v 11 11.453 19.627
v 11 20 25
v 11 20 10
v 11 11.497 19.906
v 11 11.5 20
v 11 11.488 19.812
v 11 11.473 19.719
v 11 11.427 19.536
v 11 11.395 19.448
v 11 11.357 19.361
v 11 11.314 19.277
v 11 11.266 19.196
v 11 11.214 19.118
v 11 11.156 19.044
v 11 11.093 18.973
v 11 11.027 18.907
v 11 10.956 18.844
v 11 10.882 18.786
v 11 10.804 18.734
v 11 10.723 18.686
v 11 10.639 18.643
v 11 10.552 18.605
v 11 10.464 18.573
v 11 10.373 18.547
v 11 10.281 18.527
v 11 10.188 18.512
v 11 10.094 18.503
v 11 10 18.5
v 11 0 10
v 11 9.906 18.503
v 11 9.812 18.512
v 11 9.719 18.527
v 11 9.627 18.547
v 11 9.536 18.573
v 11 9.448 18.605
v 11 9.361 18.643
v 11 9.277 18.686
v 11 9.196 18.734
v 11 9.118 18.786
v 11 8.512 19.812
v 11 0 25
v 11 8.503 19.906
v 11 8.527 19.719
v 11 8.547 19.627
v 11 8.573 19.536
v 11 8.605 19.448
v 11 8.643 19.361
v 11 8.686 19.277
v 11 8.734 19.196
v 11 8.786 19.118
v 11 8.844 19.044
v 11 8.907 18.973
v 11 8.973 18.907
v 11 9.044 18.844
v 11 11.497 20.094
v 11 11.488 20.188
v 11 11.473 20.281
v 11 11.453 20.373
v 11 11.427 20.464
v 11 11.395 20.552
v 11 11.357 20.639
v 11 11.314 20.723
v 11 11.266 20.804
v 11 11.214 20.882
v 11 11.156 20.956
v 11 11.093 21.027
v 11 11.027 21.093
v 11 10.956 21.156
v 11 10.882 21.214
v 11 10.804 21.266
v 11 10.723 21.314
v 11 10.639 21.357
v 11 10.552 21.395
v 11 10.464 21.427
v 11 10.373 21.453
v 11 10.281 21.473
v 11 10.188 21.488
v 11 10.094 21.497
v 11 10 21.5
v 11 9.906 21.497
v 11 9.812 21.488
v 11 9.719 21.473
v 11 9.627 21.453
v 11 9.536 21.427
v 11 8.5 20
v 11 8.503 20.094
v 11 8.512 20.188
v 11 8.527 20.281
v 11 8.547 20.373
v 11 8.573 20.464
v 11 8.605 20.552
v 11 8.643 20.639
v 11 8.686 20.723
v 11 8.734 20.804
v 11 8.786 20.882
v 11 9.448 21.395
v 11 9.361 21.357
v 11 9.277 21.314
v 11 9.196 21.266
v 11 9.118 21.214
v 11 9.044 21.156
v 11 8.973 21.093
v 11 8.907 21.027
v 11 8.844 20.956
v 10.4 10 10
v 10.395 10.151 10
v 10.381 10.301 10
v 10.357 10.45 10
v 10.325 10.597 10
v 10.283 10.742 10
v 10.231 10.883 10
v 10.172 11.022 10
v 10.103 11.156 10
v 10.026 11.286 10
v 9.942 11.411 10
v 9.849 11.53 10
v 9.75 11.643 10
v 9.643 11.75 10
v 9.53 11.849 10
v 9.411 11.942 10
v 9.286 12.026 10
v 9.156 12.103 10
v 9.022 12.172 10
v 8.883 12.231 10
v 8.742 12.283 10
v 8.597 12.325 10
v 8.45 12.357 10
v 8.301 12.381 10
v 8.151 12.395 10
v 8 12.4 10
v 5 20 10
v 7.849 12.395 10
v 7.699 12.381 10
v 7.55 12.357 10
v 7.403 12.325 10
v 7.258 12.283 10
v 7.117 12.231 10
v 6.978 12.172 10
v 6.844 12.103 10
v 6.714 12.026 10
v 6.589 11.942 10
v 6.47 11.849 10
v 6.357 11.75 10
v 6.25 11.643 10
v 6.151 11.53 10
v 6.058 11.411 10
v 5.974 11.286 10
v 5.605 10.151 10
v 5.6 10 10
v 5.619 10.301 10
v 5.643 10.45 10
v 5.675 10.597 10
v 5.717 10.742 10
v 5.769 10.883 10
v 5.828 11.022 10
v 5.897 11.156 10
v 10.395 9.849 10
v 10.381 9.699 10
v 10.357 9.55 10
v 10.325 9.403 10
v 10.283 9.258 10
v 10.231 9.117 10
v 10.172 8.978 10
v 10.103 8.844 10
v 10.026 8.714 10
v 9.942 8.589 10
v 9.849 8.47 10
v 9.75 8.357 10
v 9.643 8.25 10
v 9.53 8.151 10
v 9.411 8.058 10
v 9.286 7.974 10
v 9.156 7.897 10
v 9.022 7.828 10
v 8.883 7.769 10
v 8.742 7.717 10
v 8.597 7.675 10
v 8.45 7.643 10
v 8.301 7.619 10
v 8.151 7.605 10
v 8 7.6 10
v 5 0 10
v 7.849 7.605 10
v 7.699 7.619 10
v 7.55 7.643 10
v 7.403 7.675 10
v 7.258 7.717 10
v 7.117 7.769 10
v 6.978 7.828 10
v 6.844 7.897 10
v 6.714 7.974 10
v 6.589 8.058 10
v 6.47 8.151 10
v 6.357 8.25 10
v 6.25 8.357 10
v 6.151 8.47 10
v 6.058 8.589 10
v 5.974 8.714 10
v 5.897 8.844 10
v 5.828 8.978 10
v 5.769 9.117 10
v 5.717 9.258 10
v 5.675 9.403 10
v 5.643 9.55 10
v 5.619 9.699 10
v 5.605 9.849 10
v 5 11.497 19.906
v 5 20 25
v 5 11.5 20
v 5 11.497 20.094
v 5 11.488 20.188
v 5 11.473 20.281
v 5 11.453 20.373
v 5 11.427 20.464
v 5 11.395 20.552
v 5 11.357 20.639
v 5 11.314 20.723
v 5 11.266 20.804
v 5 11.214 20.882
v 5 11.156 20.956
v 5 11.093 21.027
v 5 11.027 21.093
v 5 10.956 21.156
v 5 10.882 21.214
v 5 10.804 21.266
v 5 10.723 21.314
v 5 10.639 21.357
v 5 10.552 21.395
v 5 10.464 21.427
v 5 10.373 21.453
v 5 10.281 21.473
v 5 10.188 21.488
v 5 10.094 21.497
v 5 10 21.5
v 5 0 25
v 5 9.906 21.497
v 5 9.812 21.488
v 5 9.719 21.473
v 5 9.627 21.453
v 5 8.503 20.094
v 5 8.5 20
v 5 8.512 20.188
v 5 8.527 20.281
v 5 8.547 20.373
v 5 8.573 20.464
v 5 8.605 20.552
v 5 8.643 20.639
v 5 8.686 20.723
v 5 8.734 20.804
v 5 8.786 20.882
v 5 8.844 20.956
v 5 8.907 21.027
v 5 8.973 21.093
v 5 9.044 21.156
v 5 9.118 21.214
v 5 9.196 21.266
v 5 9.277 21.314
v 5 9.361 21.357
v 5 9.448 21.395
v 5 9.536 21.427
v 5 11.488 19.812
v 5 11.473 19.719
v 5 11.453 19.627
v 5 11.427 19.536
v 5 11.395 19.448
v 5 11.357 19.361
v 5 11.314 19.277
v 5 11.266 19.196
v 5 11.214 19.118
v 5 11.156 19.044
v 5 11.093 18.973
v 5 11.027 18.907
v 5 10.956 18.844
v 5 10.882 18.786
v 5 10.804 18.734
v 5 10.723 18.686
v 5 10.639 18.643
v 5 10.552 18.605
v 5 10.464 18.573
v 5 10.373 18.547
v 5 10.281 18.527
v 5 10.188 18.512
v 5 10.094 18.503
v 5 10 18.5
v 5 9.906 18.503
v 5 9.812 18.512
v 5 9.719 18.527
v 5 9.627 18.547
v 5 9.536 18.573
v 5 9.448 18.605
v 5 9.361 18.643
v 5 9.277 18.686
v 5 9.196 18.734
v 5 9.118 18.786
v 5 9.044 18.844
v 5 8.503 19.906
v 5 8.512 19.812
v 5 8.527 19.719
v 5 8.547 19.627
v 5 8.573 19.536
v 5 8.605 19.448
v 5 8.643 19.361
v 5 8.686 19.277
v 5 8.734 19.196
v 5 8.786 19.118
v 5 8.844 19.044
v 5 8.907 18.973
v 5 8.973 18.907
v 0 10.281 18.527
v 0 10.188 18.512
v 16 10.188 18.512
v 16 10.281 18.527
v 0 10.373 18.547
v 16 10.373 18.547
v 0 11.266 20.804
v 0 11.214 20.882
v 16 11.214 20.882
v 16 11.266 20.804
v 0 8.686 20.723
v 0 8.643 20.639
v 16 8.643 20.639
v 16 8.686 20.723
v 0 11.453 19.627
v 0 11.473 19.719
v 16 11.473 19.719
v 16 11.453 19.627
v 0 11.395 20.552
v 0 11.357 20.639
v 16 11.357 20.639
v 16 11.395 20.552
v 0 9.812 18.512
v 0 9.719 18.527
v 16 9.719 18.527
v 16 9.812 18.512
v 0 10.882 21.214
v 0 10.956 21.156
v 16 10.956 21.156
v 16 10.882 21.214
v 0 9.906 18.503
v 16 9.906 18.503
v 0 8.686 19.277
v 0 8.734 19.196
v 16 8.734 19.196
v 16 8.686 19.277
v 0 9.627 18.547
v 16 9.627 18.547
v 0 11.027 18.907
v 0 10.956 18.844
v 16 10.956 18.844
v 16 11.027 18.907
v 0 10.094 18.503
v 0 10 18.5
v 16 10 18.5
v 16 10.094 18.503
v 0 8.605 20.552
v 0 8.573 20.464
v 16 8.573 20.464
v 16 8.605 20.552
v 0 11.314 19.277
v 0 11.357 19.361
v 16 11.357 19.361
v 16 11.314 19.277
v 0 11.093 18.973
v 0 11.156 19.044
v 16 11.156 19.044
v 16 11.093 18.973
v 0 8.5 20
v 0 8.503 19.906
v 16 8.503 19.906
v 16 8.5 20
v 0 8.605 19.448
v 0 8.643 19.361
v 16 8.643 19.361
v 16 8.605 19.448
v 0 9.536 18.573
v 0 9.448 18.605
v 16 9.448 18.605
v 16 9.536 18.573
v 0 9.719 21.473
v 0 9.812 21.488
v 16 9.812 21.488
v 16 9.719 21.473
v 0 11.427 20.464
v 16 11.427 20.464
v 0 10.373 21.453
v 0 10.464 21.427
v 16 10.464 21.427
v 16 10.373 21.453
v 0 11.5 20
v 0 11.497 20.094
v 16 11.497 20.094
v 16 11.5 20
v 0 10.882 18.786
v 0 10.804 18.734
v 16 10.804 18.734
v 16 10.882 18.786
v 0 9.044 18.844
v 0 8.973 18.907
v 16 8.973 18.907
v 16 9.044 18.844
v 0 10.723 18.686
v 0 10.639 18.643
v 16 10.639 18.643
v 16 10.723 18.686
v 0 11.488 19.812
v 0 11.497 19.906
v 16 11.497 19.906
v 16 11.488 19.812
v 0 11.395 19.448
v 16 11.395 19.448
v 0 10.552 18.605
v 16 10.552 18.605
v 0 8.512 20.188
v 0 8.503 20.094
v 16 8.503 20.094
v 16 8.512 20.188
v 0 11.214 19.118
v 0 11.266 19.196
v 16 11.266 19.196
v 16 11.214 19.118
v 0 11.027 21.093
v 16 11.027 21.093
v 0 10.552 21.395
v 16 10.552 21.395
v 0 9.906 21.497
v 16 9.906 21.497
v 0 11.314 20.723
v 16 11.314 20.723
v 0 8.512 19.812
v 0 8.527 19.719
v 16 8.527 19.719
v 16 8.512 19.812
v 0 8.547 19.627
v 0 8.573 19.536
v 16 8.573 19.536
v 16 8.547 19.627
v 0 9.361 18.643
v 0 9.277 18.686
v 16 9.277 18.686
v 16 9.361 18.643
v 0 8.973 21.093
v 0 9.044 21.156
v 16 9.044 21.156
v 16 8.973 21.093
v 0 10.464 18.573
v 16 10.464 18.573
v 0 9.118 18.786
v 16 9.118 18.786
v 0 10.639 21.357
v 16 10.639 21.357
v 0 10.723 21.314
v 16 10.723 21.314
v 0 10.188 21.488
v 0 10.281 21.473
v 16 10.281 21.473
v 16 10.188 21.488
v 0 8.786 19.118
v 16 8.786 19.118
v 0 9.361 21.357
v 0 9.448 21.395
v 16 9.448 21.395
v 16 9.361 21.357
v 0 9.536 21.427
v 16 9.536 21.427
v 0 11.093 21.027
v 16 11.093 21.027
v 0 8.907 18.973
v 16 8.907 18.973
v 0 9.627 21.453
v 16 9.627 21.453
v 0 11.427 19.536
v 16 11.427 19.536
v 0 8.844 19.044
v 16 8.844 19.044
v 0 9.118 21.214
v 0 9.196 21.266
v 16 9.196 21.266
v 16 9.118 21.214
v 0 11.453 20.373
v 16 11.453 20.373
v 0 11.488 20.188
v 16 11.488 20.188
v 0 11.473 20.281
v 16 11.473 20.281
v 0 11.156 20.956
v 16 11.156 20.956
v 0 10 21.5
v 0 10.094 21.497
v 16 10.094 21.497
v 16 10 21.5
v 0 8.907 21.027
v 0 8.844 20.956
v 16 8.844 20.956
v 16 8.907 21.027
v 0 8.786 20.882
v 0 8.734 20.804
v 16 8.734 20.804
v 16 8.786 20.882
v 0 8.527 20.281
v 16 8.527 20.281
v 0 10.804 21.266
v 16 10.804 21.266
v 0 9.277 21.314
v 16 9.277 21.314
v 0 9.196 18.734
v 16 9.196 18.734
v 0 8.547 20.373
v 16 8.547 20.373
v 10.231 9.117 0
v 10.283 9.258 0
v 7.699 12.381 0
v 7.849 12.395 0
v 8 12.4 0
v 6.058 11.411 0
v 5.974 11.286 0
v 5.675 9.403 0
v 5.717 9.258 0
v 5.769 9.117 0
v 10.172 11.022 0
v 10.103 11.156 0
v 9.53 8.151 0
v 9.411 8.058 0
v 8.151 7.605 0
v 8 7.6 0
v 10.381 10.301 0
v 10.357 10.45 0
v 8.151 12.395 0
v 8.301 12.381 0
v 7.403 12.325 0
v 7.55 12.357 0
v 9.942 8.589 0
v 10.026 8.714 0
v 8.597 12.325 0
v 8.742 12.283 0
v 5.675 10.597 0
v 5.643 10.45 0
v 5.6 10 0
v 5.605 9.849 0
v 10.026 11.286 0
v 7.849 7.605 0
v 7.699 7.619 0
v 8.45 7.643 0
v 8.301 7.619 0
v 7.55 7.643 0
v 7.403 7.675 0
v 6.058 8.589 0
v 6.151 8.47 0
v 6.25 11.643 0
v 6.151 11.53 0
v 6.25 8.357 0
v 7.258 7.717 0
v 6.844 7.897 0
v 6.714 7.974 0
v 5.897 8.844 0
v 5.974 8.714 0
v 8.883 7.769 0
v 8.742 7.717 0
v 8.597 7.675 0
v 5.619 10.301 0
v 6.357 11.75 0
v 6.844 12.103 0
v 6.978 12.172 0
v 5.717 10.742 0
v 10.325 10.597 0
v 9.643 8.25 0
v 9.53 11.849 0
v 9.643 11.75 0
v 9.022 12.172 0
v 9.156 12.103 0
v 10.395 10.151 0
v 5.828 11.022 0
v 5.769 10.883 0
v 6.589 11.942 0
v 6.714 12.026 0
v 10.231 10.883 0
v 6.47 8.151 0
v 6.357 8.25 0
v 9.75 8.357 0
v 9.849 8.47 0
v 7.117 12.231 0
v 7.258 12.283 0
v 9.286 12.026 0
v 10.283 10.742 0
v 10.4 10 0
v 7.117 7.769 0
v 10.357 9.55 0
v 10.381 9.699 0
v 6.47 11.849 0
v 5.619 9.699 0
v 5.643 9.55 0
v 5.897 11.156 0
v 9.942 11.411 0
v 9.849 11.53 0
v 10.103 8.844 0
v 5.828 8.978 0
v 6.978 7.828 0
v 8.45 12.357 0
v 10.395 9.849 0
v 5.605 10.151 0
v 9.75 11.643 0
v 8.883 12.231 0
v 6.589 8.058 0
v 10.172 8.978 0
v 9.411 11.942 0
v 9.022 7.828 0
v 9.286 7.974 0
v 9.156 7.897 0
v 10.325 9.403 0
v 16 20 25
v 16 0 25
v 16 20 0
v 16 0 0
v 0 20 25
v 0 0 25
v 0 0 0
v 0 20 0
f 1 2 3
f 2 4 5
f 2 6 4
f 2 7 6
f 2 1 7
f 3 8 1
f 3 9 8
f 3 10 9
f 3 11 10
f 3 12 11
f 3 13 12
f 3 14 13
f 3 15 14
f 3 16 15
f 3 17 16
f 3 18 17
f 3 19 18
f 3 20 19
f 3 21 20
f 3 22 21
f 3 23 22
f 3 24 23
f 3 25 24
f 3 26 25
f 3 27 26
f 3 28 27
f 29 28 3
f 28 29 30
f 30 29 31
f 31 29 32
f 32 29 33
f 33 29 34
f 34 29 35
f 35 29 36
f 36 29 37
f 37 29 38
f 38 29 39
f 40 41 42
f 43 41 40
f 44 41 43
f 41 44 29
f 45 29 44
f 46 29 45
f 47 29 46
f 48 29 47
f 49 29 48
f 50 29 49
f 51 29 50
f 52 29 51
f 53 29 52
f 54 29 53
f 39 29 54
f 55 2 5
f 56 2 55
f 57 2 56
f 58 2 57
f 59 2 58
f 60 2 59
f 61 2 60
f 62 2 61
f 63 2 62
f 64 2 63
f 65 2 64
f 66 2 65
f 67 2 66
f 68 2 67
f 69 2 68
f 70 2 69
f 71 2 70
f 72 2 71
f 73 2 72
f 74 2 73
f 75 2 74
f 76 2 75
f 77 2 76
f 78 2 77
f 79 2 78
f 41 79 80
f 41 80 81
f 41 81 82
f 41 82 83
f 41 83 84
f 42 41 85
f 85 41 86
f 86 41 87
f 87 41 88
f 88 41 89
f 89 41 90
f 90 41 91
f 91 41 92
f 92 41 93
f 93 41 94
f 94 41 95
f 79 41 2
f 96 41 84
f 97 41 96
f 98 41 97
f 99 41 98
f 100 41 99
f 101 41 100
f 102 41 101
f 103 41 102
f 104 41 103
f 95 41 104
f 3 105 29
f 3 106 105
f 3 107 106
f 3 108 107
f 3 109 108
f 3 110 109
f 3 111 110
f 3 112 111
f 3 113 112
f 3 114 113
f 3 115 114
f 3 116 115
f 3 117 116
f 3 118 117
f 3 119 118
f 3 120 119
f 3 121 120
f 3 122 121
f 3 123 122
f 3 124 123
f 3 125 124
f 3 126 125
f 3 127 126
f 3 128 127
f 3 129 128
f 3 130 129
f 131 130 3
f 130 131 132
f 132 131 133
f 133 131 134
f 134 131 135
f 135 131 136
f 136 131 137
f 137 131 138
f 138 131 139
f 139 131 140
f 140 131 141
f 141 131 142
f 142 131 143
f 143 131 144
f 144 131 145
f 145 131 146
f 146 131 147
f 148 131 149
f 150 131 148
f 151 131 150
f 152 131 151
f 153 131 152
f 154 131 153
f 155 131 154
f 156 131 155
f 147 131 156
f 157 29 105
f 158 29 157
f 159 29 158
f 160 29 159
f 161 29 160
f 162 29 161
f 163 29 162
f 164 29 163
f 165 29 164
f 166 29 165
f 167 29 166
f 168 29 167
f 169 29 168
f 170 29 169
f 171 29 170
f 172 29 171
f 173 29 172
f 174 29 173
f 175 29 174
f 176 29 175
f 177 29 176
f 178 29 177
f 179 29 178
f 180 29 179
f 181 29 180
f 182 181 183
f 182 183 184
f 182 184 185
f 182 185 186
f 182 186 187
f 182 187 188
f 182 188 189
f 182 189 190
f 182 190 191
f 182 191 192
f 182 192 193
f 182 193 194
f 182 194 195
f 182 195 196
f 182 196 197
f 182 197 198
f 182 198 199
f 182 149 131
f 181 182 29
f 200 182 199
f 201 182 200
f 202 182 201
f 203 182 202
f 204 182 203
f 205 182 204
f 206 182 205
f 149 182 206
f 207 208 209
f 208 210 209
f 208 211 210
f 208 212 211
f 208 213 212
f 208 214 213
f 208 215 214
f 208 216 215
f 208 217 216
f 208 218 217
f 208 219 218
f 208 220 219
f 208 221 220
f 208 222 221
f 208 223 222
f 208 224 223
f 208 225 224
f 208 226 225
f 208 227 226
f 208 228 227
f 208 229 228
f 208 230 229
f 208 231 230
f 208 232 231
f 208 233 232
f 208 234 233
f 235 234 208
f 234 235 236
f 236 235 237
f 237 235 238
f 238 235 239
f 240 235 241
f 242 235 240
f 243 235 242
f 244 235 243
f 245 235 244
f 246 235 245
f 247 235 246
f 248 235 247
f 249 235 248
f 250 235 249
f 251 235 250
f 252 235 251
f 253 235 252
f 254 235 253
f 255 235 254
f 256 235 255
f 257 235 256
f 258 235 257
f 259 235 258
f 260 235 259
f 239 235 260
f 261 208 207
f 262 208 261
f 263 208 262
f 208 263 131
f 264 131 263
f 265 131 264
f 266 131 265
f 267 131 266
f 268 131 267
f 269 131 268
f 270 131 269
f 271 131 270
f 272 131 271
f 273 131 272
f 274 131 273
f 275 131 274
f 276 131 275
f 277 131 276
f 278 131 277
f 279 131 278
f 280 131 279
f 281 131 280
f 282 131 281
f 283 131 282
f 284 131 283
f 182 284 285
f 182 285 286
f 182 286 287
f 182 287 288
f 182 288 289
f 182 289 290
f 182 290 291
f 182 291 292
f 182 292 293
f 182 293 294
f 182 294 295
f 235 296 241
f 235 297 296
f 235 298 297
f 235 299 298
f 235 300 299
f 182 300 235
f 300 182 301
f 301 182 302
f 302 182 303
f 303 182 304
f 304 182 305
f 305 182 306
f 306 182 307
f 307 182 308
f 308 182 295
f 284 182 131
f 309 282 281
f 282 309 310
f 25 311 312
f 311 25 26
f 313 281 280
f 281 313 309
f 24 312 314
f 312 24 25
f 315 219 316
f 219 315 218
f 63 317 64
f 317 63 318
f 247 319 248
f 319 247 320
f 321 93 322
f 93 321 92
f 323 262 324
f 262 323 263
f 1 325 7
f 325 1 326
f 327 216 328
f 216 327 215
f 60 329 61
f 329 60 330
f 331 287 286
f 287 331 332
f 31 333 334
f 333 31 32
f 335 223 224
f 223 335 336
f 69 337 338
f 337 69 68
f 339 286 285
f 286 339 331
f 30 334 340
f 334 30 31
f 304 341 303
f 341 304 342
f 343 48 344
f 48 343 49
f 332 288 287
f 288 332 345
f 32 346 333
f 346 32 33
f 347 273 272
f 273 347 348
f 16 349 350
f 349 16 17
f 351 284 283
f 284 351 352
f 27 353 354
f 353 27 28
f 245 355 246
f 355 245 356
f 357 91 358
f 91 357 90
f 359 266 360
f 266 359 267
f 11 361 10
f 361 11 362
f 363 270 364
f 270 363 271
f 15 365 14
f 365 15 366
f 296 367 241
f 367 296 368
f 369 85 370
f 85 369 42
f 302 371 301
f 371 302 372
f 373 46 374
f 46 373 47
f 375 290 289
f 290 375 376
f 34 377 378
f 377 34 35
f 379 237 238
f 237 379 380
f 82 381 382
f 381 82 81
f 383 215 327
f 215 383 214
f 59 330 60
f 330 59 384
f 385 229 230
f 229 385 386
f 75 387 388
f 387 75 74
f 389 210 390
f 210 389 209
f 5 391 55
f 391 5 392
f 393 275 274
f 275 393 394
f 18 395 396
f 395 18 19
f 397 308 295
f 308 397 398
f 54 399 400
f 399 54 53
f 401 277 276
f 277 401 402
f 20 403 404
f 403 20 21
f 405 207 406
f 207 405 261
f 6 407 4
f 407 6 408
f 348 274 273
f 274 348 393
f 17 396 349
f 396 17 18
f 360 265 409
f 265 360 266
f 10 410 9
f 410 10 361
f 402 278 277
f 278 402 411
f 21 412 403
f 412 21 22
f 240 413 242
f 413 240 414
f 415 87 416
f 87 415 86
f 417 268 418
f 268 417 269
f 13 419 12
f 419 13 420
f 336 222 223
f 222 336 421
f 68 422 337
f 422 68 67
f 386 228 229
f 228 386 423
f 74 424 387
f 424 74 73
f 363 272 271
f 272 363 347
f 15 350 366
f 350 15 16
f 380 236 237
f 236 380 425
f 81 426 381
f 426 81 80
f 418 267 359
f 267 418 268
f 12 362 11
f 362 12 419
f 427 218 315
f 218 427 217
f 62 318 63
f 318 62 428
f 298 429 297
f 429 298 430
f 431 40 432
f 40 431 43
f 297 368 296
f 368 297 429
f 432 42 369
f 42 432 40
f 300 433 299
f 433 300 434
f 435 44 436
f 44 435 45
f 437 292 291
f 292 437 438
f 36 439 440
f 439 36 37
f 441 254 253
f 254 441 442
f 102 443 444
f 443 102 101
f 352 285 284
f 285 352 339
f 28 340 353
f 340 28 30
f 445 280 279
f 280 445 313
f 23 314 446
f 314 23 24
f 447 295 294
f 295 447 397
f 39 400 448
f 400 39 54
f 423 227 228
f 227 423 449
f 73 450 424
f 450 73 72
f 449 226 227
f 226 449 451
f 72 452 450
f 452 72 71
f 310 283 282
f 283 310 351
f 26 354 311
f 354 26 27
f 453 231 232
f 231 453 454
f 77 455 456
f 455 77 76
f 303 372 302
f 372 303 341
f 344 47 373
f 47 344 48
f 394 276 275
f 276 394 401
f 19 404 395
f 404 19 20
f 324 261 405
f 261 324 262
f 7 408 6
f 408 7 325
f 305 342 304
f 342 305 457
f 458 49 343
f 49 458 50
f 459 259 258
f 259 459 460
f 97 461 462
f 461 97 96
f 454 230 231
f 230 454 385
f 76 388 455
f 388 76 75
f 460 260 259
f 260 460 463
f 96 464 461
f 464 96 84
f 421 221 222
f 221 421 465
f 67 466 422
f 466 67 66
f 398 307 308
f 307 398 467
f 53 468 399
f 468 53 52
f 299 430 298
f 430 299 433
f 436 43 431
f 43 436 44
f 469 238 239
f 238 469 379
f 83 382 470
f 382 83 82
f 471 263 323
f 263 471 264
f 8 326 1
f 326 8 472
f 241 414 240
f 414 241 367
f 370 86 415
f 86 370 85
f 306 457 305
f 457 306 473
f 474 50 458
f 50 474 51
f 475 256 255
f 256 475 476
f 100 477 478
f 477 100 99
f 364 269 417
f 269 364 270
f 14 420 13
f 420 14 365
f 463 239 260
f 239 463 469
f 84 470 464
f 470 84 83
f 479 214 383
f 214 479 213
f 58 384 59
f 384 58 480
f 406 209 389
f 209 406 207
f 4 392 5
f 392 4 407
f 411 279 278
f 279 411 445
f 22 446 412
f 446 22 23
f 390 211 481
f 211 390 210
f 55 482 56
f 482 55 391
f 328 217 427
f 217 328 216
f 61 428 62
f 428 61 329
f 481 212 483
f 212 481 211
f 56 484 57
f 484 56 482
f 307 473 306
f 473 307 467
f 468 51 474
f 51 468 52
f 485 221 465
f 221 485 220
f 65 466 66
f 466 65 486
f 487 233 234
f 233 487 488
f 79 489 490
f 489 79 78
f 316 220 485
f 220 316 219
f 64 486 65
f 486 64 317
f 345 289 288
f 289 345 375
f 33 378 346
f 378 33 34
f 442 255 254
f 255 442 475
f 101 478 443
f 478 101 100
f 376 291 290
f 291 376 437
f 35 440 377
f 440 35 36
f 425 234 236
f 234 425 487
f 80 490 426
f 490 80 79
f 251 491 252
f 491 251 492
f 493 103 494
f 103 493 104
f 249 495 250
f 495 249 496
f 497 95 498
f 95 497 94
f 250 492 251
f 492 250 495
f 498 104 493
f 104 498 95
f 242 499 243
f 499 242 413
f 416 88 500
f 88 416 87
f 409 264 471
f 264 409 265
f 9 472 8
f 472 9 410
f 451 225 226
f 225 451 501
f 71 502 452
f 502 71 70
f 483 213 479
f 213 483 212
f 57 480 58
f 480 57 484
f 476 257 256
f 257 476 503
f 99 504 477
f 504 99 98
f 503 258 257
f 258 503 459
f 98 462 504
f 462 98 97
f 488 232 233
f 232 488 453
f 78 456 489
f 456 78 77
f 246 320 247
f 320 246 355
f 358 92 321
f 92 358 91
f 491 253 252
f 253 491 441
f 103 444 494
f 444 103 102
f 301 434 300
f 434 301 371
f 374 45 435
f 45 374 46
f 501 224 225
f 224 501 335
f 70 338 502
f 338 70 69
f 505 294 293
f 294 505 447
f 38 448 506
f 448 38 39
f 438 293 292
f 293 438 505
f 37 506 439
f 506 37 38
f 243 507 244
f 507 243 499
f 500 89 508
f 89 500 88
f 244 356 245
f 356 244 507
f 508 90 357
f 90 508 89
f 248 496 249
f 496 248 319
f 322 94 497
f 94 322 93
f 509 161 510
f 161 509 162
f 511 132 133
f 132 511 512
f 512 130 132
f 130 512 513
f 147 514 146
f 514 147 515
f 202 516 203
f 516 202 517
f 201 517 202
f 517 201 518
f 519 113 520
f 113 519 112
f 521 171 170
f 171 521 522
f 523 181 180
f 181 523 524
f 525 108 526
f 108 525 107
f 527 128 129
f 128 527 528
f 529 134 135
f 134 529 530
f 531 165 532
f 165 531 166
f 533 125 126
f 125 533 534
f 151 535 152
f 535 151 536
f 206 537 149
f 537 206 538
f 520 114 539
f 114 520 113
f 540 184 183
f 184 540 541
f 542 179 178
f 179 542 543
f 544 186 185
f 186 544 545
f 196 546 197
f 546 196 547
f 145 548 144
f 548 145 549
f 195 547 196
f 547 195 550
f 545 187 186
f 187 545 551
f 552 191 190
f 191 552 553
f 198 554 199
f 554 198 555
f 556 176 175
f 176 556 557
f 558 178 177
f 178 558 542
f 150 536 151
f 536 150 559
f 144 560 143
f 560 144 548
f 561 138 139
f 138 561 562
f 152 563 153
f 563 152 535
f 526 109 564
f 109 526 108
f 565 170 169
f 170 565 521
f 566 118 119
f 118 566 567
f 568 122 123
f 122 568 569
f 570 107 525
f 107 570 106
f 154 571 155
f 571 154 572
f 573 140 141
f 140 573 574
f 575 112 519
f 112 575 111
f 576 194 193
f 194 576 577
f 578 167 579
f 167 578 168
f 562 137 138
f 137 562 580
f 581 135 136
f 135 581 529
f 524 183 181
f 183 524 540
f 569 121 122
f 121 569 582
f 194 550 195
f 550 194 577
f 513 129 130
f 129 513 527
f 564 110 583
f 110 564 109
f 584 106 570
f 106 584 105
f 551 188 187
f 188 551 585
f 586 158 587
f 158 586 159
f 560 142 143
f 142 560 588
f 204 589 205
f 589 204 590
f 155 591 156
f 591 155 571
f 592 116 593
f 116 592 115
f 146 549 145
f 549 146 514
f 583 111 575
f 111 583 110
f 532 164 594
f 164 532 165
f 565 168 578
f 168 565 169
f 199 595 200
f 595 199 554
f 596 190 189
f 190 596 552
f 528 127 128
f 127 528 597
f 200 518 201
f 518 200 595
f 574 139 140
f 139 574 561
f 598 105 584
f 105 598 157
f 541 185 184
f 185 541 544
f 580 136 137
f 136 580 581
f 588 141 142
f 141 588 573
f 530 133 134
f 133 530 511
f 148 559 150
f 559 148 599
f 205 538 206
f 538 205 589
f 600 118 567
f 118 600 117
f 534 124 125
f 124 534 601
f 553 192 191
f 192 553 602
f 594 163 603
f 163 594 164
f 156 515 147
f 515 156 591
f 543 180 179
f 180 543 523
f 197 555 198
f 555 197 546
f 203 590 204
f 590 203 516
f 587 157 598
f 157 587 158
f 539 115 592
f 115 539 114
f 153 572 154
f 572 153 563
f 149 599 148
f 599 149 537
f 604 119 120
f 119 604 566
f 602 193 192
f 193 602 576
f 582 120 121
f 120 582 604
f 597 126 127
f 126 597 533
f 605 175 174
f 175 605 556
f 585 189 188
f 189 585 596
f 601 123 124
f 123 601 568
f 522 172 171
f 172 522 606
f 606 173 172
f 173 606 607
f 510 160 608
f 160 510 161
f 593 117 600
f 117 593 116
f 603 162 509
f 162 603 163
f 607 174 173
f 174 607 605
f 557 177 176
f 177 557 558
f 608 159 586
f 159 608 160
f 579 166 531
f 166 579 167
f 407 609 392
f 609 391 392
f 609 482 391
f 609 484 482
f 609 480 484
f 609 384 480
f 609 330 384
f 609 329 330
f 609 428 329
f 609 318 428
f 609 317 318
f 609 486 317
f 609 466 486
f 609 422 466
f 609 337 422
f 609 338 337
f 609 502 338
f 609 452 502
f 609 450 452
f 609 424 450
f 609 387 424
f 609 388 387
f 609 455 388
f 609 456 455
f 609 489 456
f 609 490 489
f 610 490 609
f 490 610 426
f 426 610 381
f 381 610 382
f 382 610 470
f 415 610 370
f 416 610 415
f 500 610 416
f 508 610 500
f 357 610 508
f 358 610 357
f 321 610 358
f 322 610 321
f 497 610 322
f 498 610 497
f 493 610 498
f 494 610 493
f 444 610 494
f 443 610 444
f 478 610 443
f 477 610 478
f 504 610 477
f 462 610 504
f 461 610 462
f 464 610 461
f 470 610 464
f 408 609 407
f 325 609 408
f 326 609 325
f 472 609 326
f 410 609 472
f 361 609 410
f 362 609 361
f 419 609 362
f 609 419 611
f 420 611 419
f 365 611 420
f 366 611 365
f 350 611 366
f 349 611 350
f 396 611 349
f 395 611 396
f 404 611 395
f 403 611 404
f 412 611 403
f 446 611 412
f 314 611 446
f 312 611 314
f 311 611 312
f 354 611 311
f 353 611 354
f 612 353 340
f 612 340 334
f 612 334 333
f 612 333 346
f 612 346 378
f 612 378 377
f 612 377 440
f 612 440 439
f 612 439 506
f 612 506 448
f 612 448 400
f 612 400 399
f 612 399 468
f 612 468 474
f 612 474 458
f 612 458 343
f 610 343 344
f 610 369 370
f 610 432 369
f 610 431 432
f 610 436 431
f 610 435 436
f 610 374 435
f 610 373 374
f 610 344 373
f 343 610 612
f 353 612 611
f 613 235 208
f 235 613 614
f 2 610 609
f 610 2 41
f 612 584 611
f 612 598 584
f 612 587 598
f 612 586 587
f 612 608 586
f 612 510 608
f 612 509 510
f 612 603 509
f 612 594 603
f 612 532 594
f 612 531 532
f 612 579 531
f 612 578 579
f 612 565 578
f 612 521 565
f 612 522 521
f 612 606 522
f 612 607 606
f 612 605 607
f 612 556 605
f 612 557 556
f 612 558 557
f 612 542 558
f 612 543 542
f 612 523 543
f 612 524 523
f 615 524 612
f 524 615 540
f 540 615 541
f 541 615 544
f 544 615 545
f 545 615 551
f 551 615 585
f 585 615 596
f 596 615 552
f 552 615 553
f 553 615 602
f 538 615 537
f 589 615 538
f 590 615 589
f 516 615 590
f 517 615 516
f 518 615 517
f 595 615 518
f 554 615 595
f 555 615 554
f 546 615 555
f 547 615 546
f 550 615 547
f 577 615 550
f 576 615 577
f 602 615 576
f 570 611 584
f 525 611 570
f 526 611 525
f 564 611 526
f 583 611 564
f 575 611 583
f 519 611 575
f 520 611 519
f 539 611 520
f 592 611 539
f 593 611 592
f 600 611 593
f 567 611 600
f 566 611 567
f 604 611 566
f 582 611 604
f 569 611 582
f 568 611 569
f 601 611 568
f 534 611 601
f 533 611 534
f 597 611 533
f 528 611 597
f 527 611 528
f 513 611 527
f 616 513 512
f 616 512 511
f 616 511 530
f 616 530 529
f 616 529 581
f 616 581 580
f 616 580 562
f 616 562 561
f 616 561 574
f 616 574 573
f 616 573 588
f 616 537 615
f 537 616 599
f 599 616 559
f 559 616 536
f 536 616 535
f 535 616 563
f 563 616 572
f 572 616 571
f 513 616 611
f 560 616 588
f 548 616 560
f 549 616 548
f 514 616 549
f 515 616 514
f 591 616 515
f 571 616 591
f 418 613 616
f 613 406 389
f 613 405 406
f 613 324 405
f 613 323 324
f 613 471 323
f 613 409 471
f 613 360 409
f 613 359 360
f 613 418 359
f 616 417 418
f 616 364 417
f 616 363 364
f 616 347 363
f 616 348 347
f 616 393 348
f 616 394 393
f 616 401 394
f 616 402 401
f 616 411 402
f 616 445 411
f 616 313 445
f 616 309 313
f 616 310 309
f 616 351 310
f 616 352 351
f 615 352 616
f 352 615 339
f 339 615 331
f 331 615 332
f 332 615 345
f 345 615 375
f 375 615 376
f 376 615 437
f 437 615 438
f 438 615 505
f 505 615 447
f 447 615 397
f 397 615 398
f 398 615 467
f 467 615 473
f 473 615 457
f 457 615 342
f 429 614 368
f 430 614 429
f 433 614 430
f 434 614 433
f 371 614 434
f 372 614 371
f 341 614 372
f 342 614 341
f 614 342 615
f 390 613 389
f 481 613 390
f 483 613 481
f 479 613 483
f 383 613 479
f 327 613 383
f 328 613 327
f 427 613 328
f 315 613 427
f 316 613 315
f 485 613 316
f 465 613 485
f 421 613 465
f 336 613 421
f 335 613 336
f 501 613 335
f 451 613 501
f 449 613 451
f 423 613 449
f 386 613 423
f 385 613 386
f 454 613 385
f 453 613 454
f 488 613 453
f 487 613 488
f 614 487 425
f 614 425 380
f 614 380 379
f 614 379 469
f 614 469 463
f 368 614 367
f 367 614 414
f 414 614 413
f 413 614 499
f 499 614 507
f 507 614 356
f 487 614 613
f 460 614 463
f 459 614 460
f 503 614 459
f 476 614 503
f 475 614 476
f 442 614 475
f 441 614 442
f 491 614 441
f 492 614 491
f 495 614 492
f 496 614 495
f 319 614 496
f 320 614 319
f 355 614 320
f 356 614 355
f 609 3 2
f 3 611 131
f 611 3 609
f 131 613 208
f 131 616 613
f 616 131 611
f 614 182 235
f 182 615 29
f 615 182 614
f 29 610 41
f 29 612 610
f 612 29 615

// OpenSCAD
difference(){
	union(){        

        translate([0,0,0]){
           cube([16,20,25], center=false);
        }
        
        
       
        
	}
	union() {

        translate([5,-1,10]){
           cube([6,30,30], center=false);
        }


        translate([0,10,20]){
            rotate(a = [0,90,0]) {
                cylinder(h=300, r=1.5, $fn=100, center=true);
            }
        }	
        
        
        translate([8,10,0]){
            rotate(a = [0,0,90]) {
                cylinder(h=30, r=2.4, $fn=100, center=true);
            }
        }	




	}
}
